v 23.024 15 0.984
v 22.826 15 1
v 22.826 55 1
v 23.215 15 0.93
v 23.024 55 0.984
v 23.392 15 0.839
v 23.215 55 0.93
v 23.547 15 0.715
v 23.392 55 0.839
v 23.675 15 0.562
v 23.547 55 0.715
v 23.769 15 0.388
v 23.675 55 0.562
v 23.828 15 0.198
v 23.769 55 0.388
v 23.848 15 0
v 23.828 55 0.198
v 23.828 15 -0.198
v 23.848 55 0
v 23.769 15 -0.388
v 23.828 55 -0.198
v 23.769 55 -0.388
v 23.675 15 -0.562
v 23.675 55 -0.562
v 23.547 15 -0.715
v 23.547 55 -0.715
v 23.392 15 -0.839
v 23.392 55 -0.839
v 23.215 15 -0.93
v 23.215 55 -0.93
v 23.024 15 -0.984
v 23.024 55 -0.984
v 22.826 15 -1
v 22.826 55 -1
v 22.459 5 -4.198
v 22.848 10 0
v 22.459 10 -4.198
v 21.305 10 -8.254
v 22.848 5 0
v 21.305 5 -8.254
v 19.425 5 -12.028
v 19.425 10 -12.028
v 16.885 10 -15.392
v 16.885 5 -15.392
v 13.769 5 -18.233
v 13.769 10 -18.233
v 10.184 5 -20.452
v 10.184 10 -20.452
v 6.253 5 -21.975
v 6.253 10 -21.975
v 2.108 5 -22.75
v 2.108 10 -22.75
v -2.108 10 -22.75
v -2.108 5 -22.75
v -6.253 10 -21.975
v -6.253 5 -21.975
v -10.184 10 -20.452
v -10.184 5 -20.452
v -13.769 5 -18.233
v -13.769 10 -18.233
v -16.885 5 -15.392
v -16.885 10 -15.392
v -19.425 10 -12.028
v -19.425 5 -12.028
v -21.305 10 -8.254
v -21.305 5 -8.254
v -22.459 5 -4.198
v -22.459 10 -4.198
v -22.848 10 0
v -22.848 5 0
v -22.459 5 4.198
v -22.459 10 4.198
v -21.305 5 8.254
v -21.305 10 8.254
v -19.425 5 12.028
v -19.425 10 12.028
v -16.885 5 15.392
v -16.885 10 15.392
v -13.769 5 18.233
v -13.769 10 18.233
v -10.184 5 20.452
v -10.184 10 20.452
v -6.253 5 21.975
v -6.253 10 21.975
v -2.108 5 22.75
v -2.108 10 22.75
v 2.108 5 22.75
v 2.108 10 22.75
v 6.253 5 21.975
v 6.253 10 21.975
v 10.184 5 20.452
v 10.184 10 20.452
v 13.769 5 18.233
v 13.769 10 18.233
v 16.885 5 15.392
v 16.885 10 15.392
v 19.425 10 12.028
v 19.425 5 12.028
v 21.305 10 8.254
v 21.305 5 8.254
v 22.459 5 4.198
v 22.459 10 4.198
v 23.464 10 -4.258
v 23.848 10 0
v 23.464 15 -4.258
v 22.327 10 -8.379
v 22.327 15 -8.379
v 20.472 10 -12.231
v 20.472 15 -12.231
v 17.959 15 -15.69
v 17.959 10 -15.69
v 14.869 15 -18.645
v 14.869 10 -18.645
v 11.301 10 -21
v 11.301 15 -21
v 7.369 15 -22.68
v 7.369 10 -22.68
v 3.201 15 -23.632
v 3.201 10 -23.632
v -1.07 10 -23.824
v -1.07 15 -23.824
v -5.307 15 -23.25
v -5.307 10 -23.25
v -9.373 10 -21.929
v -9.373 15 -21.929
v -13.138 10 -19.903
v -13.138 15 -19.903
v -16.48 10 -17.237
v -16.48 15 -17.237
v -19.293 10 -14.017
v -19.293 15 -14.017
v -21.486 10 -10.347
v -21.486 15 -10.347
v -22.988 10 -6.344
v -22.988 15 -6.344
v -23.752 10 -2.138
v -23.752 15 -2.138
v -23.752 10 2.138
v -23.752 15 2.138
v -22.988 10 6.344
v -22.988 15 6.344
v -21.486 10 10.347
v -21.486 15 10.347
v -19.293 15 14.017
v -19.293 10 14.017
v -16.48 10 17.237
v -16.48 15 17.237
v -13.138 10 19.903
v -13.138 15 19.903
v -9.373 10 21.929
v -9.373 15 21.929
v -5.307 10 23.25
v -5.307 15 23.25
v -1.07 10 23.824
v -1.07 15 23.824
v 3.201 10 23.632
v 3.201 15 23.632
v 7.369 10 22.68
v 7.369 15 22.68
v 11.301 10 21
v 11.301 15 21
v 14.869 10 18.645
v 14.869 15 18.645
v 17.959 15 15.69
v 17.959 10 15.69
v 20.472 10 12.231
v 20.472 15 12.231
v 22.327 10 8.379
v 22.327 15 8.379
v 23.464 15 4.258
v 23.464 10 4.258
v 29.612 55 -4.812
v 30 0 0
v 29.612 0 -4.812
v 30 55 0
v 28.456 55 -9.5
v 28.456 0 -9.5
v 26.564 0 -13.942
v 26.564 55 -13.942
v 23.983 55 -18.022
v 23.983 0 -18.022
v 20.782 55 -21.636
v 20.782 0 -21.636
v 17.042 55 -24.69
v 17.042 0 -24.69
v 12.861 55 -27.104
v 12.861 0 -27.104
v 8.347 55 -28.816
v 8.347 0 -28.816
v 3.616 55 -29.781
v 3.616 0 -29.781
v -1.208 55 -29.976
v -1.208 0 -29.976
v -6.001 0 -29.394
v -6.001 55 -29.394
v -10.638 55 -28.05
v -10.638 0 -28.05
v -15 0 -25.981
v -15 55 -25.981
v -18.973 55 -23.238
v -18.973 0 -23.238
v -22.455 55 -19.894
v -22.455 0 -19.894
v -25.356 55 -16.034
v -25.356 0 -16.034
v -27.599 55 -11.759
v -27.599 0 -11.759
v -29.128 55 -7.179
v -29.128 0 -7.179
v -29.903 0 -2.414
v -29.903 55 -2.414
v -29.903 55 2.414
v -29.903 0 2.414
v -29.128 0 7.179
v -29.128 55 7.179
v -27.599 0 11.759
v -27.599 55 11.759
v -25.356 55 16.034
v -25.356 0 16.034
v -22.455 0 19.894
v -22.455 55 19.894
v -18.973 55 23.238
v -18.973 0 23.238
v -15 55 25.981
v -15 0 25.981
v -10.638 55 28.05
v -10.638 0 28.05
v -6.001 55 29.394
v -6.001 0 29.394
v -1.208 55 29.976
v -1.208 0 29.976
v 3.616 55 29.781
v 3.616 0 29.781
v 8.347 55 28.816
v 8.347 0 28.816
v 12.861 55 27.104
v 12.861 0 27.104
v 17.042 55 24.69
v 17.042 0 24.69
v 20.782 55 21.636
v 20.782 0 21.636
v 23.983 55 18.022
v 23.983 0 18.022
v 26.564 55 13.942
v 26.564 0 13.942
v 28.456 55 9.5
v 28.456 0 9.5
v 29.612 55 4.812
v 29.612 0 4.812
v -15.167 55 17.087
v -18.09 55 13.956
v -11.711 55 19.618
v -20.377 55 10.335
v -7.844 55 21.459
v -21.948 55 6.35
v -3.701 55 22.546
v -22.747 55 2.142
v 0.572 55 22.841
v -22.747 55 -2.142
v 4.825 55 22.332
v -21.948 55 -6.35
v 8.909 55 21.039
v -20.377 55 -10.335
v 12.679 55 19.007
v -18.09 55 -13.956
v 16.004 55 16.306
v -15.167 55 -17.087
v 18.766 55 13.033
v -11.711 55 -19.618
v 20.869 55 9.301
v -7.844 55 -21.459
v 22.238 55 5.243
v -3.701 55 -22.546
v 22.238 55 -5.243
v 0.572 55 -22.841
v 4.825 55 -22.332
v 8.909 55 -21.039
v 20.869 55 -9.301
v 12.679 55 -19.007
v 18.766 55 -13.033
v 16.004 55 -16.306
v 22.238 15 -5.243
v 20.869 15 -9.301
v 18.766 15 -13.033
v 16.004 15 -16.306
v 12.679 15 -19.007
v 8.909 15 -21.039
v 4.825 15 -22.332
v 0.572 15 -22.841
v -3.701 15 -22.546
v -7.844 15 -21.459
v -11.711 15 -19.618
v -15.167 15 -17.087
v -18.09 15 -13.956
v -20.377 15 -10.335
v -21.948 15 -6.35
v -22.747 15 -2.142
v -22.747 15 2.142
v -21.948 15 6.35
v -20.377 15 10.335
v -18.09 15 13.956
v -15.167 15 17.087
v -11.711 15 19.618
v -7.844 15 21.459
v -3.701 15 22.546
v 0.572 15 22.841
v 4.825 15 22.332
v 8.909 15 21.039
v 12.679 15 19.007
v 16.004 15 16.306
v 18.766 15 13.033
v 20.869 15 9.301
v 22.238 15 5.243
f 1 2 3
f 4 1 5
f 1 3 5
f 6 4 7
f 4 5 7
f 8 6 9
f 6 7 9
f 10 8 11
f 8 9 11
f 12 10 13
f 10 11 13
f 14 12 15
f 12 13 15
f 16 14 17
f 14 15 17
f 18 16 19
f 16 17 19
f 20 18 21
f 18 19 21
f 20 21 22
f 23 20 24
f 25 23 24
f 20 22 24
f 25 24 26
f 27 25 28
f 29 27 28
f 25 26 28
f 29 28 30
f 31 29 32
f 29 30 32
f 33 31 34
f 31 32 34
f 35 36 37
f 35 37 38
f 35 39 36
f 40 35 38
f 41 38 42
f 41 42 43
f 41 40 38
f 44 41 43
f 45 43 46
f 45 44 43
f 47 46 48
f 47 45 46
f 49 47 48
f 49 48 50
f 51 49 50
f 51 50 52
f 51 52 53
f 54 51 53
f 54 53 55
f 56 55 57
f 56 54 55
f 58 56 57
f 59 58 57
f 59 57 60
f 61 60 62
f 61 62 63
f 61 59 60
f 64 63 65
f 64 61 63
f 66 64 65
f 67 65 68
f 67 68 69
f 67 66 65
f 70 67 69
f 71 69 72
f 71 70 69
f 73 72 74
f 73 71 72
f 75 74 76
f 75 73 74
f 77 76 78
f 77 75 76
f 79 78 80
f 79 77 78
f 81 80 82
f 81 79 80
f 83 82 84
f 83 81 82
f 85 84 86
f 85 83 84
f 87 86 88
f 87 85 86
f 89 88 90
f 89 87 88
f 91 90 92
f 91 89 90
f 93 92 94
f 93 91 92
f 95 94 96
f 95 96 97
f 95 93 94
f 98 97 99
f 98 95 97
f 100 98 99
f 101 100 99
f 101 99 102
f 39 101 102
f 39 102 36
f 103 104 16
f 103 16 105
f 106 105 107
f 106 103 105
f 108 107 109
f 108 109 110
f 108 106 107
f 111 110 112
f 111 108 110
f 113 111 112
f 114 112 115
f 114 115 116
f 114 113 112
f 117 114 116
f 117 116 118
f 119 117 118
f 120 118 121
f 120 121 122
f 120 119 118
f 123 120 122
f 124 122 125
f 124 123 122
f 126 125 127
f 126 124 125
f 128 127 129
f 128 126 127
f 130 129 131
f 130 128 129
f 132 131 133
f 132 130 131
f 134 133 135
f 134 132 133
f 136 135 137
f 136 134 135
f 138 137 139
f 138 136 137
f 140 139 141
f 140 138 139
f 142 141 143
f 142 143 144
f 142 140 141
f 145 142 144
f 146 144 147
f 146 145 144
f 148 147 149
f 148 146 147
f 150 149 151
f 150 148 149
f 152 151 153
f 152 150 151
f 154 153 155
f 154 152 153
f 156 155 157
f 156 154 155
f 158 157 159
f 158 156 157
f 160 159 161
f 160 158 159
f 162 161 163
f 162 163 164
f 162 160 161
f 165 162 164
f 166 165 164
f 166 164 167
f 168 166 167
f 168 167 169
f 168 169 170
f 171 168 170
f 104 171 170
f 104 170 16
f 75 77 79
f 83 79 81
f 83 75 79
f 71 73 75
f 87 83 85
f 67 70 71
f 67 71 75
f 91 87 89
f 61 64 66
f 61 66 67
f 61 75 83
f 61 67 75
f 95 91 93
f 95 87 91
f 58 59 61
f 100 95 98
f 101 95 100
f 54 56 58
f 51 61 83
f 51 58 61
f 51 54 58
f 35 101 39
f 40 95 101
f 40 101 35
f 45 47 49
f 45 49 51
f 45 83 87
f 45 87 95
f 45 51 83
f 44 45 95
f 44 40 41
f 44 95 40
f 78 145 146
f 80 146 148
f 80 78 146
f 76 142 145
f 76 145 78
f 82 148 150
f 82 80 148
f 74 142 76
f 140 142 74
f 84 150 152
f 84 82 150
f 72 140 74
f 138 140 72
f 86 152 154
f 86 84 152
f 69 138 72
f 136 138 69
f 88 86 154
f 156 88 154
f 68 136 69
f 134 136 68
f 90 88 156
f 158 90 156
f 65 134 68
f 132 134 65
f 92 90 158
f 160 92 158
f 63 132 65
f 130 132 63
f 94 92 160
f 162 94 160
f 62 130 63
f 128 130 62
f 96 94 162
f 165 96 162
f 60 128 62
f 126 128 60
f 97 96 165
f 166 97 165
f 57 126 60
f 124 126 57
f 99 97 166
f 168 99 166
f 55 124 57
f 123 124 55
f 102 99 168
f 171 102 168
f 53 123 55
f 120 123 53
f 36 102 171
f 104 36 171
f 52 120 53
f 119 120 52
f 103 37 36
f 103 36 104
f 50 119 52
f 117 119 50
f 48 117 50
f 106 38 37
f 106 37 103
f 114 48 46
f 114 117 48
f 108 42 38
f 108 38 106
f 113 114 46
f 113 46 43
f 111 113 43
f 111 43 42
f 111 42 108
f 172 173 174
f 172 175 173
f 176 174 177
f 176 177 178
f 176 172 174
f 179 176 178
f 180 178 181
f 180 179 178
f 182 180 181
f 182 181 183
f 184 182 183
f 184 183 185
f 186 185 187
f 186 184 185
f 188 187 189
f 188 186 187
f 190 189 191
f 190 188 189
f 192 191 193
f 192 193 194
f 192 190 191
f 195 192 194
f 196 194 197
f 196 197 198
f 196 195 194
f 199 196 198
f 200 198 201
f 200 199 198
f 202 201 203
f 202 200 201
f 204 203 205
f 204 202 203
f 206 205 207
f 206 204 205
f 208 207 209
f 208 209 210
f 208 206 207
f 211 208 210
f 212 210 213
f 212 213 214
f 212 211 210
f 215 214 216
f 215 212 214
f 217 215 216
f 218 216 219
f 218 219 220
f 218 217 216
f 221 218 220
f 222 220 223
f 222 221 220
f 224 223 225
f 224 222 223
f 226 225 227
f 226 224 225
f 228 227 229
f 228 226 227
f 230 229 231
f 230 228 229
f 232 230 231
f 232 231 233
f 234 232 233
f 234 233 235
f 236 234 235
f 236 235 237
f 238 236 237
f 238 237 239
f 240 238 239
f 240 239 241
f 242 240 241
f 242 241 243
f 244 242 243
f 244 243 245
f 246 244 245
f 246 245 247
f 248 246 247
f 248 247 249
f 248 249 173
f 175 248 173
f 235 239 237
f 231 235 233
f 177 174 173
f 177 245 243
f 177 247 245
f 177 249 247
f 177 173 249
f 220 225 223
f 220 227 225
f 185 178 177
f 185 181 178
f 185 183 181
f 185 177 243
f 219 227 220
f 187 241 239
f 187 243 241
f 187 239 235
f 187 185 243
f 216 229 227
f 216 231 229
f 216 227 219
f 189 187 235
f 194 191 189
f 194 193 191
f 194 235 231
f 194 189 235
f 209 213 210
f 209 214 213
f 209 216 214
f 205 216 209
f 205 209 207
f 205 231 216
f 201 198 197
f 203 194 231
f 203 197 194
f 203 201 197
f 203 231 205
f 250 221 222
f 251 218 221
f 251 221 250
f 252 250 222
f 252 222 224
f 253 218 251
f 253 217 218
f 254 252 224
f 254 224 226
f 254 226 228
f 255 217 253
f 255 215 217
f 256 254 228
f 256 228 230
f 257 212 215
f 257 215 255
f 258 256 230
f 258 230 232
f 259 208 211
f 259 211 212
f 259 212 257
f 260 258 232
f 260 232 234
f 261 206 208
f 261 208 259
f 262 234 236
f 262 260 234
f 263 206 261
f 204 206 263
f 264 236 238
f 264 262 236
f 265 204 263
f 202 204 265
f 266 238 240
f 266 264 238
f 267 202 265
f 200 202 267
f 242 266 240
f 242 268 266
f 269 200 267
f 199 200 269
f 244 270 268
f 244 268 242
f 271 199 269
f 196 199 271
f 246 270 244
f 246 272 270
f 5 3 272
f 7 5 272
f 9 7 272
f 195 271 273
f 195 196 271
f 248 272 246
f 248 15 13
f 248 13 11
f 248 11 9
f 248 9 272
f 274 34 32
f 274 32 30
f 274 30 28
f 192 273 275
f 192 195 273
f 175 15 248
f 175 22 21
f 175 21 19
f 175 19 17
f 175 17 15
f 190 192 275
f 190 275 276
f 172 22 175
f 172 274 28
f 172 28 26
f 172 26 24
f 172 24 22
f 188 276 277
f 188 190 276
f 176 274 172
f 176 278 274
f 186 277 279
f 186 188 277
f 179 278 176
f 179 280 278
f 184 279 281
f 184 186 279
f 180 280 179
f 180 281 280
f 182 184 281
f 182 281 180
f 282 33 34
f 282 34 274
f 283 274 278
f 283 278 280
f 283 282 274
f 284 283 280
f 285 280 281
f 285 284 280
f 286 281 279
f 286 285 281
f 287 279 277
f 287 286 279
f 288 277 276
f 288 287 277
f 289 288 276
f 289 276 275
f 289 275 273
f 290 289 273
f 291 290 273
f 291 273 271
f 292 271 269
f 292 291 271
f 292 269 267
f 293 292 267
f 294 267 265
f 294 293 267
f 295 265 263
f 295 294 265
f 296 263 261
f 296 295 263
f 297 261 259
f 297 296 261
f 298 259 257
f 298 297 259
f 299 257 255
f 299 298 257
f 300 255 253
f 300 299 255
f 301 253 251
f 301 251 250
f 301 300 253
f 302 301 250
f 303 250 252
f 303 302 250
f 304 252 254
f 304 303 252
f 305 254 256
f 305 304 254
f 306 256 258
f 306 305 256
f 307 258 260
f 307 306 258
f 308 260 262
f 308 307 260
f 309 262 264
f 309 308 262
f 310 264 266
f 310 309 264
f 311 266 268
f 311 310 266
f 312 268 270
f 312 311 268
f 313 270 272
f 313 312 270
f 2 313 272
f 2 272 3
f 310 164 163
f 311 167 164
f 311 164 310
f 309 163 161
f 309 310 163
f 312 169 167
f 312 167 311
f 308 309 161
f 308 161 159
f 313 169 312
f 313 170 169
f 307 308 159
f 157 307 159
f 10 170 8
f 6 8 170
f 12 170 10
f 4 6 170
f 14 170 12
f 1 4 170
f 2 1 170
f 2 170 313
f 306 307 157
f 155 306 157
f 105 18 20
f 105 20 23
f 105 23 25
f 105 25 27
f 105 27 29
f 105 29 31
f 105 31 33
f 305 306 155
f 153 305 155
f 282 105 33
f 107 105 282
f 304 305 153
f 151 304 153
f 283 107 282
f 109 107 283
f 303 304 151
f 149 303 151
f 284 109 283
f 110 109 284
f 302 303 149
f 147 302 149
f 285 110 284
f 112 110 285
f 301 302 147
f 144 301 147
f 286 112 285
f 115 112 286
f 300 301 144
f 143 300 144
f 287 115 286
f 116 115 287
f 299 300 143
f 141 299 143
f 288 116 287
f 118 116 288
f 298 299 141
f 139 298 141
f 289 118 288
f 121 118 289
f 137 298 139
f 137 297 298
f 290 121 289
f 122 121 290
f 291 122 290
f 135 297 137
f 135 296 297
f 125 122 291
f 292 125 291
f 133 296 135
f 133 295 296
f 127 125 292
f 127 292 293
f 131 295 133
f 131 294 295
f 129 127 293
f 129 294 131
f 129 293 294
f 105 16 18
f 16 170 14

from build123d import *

# Parameters (mm, degrees)
SKETCH6_R          = 1
CUT_EXTRUDE4_DEPTH = 40


with BuildPart() as part:
    # Sketch4 → Revolve2 (revolve)
    with BuildSketch(Plane.XY):
        Polygon((0, 0), (30, 0), (30, 55), (22.847682119, 55), (22.847682119, 15), (23.847682119, 15), (23.847682119, 10), (22.847682119, 10), (22.847682119, 5), (0, 5), align=None)
    revolve(axis=Axis((0, -1100.033698247, 0), (0, 1, 0)))

    # Sketch6 → Cut-Extrude4 (cut)
    with BuildSketch(Plane(origin=(0, 55, 0), x_dir=(1, 0, 0), z_dir=(0, 1, 0))):
        with Locations((22.847682119, 0)):
            Circle(SKETCH6_R)
    extrude(amount=-CUT_EXTRUDE4_DEPTH, mode=Mode.SUBTRACT)


solid = part.part
